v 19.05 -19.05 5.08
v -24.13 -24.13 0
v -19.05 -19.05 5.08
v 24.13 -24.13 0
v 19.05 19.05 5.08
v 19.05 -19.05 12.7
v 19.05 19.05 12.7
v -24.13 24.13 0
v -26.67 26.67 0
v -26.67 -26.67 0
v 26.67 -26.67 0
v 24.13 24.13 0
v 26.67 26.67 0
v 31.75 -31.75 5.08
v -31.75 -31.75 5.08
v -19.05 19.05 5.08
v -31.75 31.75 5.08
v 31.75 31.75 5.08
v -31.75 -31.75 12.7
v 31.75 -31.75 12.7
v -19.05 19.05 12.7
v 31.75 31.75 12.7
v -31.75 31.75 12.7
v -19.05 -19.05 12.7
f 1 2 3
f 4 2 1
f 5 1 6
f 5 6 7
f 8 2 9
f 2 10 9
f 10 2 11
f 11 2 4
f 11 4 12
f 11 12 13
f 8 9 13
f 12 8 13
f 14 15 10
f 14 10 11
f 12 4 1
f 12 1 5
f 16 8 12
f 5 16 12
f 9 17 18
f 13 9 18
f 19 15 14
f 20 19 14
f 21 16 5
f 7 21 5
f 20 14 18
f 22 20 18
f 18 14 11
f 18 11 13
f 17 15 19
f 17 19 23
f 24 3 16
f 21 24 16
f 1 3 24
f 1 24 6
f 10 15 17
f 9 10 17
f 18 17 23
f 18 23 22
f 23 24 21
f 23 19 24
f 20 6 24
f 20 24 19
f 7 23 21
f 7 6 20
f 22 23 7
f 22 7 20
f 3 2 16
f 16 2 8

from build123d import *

# Parameters (mm, degrees)
F0_W     = 63.5
F0_H     = 63.5
F0_W_2   = 38.1
F0_H_2   = 38.1
F1_DEPTH = 12.7
F2_SIZE  = 5.08
F3_SIZE  = 5.08


with BuildPart() as f1:
    # F0 (on Top) → F1 (new body)
    with BuildSketch(Plane.XY):
        Rectangle(F0_W, F0_H)
        Rectangle(F0_W_2, F0_H_2, mode=Mode.SUBTRACT)
    extrude(amount=F1_DEPTH)

    # F2
    f2_edges = [f1.edges().sort_by_distance(p)[0] for p in [
        (19.05, 0, 0),
        (0, 19.05, 0),
        (-19.05, 0, 0),
        (0, -19.05, 0),
    ]]
    chamfer(f2_edges, length=F2_SIZE)

    # F3
    f3_edges = [f1.edges().sort_by_distance(p)[0] for p in [
        (0, 31.75, 0),
        (-31.75, 0, 0),
        (0, -31.75, 0),
        (31.75, 0, 0),
    ]]
    chamfer(f3_edges, length=F3_SIZE)


solid = f1.part
